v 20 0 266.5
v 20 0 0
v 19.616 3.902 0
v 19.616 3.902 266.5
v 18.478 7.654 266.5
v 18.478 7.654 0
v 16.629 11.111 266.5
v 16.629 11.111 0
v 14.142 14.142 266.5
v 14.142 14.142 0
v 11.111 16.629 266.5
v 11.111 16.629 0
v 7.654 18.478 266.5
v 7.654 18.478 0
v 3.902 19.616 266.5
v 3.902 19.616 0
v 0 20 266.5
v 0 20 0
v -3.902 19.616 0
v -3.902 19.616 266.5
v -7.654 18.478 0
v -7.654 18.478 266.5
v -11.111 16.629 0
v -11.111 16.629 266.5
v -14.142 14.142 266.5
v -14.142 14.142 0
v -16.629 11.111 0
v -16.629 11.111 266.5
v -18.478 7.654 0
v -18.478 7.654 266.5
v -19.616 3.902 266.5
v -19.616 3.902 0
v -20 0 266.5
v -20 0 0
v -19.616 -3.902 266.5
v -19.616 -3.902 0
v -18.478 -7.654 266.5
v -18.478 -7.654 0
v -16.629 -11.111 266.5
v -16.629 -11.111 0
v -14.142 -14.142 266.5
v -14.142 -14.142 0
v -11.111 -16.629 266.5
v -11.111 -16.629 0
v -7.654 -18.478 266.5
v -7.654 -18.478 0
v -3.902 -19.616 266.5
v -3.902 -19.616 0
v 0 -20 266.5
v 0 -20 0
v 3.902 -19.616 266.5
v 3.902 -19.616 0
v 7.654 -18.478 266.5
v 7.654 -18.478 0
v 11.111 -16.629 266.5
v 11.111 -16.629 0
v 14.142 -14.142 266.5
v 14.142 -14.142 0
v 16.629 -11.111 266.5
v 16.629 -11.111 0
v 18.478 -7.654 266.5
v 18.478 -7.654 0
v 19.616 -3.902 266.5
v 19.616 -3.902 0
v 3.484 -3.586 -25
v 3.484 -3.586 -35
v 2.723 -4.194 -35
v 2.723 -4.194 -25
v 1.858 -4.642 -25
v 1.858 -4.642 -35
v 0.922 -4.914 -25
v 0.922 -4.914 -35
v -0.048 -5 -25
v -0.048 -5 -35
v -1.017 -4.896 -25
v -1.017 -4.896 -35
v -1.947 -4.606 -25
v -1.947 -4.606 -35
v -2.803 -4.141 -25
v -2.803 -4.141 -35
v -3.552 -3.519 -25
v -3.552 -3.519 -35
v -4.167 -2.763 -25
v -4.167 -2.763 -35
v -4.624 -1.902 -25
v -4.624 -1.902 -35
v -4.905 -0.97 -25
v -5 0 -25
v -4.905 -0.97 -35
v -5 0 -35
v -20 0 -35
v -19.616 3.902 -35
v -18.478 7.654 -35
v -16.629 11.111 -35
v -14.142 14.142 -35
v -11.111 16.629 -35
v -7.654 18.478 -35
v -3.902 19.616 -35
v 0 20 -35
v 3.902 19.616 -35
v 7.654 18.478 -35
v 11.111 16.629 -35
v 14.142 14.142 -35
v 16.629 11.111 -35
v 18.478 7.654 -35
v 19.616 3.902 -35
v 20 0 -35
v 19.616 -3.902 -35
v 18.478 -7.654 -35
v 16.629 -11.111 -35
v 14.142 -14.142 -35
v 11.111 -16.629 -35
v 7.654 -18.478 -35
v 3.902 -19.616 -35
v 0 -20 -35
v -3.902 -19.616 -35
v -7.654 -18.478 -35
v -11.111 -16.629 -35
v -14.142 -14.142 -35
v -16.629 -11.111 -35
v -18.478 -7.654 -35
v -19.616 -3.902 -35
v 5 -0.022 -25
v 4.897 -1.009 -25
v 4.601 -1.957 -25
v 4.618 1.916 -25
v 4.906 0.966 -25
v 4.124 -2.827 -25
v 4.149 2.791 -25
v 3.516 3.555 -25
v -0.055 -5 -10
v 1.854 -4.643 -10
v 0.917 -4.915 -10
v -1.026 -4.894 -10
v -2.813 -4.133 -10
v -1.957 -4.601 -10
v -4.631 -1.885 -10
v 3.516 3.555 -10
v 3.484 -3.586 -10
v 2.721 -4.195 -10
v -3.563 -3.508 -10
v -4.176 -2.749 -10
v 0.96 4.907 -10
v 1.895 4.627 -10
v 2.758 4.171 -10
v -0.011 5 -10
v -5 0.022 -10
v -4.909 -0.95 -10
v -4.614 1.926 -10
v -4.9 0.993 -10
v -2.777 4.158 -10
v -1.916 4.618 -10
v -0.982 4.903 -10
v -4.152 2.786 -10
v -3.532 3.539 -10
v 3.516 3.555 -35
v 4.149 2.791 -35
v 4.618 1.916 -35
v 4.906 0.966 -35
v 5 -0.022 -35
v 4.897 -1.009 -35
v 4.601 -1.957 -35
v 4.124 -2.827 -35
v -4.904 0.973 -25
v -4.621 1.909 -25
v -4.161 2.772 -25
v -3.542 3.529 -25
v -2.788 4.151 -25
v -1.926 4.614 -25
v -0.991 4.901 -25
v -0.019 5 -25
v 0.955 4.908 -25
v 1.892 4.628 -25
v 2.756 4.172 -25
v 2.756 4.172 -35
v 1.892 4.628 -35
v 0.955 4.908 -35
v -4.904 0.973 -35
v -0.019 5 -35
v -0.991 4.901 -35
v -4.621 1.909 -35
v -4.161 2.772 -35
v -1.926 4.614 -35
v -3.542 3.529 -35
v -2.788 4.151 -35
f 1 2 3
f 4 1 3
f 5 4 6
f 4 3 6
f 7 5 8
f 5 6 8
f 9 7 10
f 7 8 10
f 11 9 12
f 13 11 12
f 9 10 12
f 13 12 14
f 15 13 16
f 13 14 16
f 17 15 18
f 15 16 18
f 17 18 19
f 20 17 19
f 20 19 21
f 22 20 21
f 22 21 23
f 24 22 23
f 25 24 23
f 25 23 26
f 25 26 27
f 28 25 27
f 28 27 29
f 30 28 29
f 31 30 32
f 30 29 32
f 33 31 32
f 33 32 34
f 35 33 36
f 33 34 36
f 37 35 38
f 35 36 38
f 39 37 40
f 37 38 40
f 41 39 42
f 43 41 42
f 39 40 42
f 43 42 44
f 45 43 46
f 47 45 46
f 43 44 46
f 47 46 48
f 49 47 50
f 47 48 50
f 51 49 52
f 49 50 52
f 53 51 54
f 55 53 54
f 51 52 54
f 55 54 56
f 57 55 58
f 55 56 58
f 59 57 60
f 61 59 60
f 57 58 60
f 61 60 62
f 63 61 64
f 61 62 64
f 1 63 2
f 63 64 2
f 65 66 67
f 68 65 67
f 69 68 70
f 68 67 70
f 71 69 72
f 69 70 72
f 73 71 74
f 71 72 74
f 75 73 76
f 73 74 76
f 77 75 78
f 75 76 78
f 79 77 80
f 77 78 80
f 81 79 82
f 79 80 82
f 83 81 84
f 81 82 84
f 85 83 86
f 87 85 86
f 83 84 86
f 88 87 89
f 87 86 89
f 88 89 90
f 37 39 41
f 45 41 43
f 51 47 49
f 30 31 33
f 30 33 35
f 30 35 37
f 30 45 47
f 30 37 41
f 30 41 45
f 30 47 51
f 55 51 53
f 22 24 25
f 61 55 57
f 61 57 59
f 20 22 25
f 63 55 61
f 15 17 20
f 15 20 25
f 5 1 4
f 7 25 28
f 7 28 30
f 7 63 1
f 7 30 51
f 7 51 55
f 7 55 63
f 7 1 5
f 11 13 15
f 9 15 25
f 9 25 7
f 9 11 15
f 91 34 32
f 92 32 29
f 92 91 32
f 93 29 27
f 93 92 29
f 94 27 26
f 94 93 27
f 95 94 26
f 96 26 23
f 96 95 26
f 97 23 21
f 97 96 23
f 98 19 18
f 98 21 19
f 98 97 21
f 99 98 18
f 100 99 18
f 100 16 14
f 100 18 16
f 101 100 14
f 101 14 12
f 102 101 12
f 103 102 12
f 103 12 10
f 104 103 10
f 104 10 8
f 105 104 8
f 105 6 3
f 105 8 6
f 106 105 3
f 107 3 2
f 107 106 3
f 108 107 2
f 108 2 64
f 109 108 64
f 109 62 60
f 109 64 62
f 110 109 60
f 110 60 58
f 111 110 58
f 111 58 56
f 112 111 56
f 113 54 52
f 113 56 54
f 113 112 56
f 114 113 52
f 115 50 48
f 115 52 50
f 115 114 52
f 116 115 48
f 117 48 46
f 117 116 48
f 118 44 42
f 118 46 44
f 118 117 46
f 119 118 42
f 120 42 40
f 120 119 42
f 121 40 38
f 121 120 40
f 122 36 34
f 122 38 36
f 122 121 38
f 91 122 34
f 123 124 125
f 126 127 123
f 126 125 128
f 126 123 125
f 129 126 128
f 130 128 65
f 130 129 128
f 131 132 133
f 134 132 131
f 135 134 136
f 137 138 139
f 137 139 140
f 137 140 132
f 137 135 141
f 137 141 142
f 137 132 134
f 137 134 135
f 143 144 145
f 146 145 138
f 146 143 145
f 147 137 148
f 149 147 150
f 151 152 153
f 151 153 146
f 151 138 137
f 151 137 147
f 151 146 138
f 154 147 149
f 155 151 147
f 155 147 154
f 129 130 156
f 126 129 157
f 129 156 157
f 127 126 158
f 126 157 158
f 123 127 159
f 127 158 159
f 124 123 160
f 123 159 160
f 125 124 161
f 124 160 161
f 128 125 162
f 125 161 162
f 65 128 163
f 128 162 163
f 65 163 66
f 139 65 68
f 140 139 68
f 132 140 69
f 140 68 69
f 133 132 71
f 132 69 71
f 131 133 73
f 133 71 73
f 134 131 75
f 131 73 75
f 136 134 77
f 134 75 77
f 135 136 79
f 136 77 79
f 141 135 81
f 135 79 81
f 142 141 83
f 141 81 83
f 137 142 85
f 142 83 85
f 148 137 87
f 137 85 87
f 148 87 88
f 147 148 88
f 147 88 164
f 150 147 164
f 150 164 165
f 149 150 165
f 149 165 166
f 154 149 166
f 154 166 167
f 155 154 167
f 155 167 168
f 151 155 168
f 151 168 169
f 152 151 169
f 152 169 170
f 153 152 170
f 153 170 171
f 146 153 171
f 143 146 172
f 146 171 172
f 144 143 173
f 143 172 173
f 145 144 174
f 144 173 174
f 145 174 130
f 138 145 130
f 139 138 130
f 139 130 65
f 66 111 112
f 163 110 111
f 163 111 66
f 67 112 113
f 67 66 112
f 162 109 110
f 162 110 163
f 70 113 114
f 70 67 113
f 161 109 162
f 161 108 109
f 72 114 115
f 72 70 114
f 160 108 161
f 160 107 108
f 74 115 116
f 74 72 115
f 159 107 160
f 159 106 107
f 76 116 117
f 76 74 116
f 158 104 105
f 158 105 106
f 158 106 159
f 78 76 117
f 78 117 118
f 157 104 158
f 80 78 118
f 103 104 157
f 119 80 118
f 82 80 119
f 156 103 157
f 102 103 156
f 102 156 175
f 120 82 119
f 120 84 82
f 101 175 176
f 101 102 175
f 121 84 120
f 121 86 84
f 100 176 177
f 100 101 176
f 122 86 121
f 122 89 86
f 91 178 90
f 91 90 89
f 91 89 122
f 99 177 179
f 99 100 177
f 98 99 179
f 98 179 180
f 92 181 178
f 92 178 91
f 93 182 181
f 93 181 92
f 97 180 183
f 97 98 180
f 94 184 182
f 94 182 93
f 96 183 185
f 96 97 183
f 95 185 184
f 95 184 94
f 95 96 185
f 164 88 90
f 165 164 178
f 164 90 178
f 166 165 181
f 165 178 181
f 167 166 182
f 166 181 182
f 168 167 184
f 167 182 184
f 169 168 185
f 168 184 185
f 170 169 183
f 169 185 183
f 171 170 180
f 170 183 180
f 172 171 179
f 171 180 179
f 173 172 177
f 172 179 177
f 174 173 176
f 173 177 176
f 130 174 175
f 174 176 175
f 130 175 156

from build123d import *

# Parameters (mm, degrees)
SKETCH_1_R          = 20
EXTRUDE_1_DEPTH     = 266.5
EXTRUDE_START       = 35
SKETCH_3_R          = 20
EXTRUDE_2_DEPTH     = 35
CUT_EXTRUDE_1_DEPTH = 25
SKETCH_5_R          = 5
CUT_EXTRUDE_2_DEPTH = 10


with BuildPart() as part:
    # 스케치1 → 보스-돌출1 (new body)
    with BuildSketch(Plane.XY):
        Circle(SKETCH_1_R)
    extrude(amount=EXTRUDE_1_DEPTH)

    # 스케치3 → 보스-돌출2 (add)
    with BuildSketch(Plane(origin=(0, 0, 0), x_dir=(-1, 0, 0), z_dir=(0, 0, -1)).offset(EXTRUDE_START)):
        Circle(SKETCH_3_R)
    extrude(amount=-EXTRUDE_2_DEPTH)

    # 스케치4 → 컷-돌출1 (cut)
    with BuildSketch(Plane(origin=(0, 0, -35), x_dir=(-1, 0, 0), z_dir=(0, 0, -1))):
        with BuildLine():
            Line((-3.515670801, 3.555286039), (-3.484261495, -3.586073317))
            ThreePointArc((-3.484261495, -3.586073317), (4.99995164, 0.021990913), (-3.515670801, 3.555286039))
        make_face()
    extrude(amount=-CUT_EXTRUDE_1_DEPTH, mode=Mode.SUBTRACT)

    # 스케치5 → 컷-돌출2 (cut)
    with BuildSketch(Plane(origin=(0, 0, -35), x_dir=(-1, 0, 0), z_dir=(0, 0, -1))):
        Circle(SKETCH_5_R)
    extrude(amount=-CUT_EXTRUDE_2_DEPTH, mode=Mode.SUBTRACT)


solid = part.part
